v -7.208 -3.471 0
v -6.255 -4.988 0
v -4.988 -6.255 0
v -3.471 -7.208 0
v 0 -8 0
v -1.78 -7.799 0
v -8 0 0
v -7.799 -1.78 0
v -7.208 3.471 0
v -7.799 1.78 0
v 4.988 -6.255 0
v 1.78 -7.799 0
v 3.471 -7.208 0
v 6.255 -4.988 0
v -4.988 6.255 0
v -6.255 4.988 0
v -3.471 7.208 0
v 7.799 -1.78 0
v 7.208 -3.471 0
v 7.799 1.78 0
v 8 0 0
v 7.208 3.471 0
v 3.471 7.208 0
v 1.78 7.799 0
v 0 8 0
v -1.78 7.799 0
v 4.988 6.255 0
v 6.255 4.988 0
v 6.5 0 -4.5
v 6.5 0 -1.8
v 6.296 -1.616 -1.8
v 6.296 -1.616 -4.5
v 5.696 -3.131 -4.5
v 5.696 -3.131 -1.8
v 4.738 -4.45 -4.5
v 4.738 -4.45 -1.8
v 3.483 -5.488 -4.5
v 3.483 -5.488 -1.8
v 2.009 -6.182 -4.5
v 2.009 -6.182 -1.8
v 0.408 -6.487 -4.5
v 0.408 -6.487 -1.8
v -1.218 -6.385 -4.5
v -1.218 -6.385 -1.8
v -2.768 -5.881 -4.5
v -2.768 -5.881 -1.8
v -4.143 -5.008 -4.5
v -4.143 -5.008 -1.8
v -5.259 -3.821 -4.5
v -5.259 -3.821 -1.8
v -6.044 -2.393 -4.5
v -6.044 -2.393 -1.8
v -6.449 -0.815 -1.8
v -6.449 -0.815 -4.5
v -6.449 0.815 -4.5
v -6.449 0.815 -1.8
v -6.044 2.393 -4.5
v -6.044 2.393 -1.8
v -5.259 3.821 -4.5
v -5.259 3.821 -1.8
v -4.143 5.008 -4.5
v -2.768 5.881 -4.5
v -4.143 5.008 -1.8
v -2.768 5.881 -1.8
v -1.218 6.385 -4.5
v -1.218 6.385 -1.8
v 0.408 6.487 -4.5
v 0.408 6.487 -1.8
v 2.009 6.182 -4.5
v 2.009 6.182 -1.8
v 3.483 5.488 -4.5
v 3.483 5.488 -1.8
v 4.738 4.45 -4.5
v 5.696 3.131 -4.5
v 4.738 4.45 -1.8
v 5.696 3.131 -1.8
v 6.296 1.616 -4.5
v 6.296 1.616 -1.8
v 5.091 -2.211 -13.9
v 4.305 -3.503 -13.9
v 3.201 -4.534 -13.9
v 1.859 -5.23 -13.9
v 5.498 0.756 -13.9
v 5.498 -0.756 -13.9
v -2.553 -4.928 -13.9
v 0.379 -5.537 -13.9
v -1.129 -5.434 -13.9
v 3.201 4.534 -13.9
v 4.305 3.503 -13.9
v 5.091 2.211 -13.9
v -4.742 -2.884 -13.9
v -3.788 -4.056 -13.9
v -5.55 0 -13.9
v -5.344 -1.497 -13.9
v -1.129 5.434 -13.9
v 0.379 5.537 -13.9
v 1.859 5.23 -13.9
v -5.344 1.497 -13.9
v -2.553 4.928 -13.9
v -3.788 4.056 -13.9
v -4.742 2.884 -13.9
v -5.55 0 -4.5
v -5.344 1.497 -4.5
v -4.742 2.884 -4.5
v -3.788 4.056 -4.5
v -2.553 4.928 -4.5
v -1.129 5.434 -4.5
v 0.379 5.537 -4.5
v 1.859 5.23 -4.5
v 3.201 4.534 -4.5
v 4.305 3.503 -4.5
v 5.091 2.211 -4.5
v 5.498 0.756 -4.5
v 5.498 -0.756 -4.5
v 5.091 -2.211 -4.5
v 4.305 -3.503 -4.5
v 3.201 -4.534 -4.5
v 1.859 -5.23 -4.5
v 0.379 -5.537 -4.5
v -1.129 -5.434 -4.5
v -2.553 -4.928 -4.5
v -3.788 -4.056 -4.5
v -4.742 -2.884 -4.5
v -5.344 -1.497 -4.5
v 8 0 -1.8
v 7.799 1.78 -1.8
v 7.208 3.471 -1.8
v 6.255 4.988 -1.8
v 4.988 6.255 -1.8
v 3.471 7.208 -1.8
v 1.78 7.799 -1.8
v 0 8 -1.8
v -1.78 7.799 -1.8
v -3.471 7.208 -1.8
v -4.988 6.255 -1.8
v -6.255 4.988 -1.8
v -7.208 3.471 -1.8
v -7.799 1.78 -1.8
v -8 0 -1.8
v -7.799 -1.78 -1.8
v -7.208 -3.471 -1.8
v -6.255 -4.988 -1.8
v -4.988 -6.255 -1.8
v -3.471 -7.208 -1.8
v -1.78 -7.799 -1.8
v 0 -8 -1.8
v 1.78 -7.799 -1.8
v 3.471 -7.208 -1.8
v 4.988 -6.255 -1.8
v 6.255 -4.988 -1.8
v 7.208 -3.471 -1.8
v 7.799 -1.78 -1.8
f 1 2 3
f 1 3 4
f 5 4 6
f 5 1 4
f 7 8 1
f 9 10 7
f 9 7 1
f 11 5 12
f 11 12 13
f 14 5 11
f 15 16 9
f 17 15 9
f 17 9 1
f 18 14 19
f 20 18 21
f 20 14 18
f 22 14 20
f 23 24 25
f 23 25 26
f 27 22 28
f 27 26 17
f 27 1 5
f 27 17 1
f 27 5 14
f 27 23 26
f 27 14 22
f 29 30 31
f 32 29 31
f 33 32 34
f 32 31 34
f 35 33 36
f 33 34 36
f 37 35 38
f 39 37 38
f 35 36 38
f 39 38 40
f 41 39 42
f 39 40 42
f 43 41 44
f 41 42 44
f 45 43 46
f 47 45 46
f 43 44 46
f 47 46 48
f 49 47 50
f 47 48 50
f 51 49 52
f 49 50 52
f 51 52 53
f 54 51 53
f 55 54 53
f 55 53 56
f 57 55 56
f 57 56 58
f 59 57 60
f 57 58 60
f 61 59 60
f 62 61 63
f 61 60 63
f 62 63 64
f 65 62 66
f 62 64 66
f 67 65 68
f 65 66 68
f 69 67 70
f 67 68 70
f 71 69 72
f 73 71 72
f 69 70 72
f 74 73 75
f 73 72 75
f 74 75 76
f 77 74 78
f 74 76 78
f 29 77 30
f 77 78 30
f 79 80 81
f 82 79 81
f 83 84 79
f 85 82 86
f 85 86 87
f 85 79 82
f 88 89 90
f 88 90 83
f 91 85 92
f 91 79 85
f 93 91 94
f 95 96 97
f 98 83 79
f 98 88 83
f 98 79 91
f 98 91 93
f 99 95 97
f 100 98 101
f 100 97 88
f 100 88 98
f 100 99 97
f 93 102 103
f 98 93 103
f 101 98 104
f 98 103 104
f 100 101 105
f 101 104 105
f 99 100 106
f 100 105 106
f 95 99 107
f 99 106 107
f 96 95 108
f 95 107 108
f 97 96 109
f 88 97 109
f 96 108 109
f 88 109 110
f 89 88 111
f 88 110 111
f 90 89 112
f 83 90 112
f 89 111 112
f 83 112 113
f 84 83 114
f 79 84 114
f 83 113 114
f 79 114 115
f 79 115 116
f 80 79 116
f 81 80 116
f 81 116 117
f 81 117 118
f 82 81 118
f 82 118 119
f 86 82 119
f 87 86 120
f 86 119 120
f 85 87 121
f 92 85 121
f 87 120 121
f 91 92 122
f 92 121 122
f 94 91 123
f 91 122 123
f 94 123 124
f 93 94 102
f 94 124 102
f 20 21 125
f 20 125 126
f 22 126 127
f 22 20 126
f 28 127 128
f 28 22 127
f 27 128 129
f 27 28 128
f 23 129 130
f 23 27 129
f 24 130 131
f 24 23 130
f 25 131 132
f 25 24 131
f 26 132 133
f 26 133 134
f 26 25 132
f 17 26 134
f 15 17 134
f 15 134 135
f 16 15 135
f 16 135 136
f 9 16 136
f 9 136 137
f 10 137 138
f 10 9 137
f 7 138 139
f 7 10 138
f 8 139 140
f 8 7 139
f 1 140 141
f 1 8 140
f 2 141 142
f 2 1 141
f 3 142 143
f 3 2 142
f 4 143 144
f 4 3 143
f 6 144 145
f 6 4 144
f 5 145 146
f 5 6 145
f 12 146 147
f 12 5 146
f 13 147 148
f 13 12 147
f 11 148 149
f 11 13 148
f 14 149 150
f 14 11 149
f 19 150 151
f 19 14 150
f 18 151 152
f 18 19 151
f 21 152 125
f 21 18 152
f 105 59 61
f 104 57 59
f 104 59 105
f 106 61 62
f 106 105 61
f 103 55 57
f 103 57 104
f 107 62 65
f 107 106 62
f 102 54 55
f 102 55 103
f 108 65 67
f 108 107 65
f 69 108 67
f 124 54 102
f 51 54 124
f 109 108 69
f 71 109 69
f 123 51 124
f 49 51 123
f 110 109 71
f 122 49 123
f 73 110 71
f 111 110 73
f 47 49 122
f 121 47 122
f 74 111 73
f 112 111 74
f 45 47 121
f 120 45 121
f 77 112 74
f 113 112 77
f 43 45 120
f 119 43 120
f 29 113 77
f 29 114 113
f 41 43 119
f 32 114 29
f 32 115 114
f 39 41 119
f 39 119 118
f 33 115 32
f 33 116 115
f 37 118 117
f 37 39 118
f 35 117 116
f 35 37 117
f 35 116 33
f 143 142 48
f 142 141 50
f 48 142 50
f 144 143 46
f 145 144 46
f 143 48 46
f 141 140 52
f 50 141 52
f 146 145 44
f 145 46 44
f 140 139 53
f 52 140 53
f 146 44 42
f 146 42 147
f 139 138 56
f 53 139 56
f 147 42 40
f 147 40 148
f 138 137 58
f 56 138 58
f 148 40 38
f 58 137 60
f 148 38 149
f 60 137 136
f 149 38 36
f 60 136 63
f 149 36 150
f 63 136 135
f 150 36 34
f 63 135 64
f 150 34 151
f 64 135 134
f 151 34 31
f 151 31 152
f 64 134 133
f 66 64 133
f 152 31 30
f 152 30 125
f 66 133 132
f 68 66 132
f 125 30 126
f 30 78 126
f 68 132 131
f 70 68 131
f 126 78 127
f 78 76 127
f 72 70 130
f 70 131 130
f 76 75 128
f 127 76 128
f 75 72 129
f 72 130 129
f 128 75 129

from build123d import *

# Parameters (mm, degrees)
SKETCH1_R           = 8
BOSS_EXTRUDE1_DEPTH = 1.8
SKETCH2_R           = 6.5
BOSS_EXTRUDE2_DEPTH = 2.7
SKETCH3_R           = 5.55
BOSS_EXTRUDE3_DEPTH = 9.4


with BuildPart() as part:
    # Sketch1 → Boss-Extrude1 (new body)
    with BuildSketch(Plane.XY):
        Circle(SKETCH1_R)
    extrude(amount=-BOSS_EXTRUDE1_DEPTH)

    # Sketch2 → Boss-Extrude2 (add)
    with BuildSketch(Plane(origin=(0, 0, -1.8), x_dir=(-1, 0, 0), z_dir=(0, 0, -1))):
        with Locations(Location((0, 0, 0), (0, 0, 180))):
            Circle(SKETCH2_R)
    extrude(amount=BOSS_EXTRUDE2_DEPTH)

    # Sketch3 → Boss-Extrude3 (add)
    with BuildSketch(Plane(origin=(0, 0, -4.5), x_dir=(-1, 0, 0), z_dir=(0, 0, -1))):
        Circle(SKETCH3_R)
    extrude(amount=BOSS_EXTRUDE3_DEPTH)


solid = part.part
